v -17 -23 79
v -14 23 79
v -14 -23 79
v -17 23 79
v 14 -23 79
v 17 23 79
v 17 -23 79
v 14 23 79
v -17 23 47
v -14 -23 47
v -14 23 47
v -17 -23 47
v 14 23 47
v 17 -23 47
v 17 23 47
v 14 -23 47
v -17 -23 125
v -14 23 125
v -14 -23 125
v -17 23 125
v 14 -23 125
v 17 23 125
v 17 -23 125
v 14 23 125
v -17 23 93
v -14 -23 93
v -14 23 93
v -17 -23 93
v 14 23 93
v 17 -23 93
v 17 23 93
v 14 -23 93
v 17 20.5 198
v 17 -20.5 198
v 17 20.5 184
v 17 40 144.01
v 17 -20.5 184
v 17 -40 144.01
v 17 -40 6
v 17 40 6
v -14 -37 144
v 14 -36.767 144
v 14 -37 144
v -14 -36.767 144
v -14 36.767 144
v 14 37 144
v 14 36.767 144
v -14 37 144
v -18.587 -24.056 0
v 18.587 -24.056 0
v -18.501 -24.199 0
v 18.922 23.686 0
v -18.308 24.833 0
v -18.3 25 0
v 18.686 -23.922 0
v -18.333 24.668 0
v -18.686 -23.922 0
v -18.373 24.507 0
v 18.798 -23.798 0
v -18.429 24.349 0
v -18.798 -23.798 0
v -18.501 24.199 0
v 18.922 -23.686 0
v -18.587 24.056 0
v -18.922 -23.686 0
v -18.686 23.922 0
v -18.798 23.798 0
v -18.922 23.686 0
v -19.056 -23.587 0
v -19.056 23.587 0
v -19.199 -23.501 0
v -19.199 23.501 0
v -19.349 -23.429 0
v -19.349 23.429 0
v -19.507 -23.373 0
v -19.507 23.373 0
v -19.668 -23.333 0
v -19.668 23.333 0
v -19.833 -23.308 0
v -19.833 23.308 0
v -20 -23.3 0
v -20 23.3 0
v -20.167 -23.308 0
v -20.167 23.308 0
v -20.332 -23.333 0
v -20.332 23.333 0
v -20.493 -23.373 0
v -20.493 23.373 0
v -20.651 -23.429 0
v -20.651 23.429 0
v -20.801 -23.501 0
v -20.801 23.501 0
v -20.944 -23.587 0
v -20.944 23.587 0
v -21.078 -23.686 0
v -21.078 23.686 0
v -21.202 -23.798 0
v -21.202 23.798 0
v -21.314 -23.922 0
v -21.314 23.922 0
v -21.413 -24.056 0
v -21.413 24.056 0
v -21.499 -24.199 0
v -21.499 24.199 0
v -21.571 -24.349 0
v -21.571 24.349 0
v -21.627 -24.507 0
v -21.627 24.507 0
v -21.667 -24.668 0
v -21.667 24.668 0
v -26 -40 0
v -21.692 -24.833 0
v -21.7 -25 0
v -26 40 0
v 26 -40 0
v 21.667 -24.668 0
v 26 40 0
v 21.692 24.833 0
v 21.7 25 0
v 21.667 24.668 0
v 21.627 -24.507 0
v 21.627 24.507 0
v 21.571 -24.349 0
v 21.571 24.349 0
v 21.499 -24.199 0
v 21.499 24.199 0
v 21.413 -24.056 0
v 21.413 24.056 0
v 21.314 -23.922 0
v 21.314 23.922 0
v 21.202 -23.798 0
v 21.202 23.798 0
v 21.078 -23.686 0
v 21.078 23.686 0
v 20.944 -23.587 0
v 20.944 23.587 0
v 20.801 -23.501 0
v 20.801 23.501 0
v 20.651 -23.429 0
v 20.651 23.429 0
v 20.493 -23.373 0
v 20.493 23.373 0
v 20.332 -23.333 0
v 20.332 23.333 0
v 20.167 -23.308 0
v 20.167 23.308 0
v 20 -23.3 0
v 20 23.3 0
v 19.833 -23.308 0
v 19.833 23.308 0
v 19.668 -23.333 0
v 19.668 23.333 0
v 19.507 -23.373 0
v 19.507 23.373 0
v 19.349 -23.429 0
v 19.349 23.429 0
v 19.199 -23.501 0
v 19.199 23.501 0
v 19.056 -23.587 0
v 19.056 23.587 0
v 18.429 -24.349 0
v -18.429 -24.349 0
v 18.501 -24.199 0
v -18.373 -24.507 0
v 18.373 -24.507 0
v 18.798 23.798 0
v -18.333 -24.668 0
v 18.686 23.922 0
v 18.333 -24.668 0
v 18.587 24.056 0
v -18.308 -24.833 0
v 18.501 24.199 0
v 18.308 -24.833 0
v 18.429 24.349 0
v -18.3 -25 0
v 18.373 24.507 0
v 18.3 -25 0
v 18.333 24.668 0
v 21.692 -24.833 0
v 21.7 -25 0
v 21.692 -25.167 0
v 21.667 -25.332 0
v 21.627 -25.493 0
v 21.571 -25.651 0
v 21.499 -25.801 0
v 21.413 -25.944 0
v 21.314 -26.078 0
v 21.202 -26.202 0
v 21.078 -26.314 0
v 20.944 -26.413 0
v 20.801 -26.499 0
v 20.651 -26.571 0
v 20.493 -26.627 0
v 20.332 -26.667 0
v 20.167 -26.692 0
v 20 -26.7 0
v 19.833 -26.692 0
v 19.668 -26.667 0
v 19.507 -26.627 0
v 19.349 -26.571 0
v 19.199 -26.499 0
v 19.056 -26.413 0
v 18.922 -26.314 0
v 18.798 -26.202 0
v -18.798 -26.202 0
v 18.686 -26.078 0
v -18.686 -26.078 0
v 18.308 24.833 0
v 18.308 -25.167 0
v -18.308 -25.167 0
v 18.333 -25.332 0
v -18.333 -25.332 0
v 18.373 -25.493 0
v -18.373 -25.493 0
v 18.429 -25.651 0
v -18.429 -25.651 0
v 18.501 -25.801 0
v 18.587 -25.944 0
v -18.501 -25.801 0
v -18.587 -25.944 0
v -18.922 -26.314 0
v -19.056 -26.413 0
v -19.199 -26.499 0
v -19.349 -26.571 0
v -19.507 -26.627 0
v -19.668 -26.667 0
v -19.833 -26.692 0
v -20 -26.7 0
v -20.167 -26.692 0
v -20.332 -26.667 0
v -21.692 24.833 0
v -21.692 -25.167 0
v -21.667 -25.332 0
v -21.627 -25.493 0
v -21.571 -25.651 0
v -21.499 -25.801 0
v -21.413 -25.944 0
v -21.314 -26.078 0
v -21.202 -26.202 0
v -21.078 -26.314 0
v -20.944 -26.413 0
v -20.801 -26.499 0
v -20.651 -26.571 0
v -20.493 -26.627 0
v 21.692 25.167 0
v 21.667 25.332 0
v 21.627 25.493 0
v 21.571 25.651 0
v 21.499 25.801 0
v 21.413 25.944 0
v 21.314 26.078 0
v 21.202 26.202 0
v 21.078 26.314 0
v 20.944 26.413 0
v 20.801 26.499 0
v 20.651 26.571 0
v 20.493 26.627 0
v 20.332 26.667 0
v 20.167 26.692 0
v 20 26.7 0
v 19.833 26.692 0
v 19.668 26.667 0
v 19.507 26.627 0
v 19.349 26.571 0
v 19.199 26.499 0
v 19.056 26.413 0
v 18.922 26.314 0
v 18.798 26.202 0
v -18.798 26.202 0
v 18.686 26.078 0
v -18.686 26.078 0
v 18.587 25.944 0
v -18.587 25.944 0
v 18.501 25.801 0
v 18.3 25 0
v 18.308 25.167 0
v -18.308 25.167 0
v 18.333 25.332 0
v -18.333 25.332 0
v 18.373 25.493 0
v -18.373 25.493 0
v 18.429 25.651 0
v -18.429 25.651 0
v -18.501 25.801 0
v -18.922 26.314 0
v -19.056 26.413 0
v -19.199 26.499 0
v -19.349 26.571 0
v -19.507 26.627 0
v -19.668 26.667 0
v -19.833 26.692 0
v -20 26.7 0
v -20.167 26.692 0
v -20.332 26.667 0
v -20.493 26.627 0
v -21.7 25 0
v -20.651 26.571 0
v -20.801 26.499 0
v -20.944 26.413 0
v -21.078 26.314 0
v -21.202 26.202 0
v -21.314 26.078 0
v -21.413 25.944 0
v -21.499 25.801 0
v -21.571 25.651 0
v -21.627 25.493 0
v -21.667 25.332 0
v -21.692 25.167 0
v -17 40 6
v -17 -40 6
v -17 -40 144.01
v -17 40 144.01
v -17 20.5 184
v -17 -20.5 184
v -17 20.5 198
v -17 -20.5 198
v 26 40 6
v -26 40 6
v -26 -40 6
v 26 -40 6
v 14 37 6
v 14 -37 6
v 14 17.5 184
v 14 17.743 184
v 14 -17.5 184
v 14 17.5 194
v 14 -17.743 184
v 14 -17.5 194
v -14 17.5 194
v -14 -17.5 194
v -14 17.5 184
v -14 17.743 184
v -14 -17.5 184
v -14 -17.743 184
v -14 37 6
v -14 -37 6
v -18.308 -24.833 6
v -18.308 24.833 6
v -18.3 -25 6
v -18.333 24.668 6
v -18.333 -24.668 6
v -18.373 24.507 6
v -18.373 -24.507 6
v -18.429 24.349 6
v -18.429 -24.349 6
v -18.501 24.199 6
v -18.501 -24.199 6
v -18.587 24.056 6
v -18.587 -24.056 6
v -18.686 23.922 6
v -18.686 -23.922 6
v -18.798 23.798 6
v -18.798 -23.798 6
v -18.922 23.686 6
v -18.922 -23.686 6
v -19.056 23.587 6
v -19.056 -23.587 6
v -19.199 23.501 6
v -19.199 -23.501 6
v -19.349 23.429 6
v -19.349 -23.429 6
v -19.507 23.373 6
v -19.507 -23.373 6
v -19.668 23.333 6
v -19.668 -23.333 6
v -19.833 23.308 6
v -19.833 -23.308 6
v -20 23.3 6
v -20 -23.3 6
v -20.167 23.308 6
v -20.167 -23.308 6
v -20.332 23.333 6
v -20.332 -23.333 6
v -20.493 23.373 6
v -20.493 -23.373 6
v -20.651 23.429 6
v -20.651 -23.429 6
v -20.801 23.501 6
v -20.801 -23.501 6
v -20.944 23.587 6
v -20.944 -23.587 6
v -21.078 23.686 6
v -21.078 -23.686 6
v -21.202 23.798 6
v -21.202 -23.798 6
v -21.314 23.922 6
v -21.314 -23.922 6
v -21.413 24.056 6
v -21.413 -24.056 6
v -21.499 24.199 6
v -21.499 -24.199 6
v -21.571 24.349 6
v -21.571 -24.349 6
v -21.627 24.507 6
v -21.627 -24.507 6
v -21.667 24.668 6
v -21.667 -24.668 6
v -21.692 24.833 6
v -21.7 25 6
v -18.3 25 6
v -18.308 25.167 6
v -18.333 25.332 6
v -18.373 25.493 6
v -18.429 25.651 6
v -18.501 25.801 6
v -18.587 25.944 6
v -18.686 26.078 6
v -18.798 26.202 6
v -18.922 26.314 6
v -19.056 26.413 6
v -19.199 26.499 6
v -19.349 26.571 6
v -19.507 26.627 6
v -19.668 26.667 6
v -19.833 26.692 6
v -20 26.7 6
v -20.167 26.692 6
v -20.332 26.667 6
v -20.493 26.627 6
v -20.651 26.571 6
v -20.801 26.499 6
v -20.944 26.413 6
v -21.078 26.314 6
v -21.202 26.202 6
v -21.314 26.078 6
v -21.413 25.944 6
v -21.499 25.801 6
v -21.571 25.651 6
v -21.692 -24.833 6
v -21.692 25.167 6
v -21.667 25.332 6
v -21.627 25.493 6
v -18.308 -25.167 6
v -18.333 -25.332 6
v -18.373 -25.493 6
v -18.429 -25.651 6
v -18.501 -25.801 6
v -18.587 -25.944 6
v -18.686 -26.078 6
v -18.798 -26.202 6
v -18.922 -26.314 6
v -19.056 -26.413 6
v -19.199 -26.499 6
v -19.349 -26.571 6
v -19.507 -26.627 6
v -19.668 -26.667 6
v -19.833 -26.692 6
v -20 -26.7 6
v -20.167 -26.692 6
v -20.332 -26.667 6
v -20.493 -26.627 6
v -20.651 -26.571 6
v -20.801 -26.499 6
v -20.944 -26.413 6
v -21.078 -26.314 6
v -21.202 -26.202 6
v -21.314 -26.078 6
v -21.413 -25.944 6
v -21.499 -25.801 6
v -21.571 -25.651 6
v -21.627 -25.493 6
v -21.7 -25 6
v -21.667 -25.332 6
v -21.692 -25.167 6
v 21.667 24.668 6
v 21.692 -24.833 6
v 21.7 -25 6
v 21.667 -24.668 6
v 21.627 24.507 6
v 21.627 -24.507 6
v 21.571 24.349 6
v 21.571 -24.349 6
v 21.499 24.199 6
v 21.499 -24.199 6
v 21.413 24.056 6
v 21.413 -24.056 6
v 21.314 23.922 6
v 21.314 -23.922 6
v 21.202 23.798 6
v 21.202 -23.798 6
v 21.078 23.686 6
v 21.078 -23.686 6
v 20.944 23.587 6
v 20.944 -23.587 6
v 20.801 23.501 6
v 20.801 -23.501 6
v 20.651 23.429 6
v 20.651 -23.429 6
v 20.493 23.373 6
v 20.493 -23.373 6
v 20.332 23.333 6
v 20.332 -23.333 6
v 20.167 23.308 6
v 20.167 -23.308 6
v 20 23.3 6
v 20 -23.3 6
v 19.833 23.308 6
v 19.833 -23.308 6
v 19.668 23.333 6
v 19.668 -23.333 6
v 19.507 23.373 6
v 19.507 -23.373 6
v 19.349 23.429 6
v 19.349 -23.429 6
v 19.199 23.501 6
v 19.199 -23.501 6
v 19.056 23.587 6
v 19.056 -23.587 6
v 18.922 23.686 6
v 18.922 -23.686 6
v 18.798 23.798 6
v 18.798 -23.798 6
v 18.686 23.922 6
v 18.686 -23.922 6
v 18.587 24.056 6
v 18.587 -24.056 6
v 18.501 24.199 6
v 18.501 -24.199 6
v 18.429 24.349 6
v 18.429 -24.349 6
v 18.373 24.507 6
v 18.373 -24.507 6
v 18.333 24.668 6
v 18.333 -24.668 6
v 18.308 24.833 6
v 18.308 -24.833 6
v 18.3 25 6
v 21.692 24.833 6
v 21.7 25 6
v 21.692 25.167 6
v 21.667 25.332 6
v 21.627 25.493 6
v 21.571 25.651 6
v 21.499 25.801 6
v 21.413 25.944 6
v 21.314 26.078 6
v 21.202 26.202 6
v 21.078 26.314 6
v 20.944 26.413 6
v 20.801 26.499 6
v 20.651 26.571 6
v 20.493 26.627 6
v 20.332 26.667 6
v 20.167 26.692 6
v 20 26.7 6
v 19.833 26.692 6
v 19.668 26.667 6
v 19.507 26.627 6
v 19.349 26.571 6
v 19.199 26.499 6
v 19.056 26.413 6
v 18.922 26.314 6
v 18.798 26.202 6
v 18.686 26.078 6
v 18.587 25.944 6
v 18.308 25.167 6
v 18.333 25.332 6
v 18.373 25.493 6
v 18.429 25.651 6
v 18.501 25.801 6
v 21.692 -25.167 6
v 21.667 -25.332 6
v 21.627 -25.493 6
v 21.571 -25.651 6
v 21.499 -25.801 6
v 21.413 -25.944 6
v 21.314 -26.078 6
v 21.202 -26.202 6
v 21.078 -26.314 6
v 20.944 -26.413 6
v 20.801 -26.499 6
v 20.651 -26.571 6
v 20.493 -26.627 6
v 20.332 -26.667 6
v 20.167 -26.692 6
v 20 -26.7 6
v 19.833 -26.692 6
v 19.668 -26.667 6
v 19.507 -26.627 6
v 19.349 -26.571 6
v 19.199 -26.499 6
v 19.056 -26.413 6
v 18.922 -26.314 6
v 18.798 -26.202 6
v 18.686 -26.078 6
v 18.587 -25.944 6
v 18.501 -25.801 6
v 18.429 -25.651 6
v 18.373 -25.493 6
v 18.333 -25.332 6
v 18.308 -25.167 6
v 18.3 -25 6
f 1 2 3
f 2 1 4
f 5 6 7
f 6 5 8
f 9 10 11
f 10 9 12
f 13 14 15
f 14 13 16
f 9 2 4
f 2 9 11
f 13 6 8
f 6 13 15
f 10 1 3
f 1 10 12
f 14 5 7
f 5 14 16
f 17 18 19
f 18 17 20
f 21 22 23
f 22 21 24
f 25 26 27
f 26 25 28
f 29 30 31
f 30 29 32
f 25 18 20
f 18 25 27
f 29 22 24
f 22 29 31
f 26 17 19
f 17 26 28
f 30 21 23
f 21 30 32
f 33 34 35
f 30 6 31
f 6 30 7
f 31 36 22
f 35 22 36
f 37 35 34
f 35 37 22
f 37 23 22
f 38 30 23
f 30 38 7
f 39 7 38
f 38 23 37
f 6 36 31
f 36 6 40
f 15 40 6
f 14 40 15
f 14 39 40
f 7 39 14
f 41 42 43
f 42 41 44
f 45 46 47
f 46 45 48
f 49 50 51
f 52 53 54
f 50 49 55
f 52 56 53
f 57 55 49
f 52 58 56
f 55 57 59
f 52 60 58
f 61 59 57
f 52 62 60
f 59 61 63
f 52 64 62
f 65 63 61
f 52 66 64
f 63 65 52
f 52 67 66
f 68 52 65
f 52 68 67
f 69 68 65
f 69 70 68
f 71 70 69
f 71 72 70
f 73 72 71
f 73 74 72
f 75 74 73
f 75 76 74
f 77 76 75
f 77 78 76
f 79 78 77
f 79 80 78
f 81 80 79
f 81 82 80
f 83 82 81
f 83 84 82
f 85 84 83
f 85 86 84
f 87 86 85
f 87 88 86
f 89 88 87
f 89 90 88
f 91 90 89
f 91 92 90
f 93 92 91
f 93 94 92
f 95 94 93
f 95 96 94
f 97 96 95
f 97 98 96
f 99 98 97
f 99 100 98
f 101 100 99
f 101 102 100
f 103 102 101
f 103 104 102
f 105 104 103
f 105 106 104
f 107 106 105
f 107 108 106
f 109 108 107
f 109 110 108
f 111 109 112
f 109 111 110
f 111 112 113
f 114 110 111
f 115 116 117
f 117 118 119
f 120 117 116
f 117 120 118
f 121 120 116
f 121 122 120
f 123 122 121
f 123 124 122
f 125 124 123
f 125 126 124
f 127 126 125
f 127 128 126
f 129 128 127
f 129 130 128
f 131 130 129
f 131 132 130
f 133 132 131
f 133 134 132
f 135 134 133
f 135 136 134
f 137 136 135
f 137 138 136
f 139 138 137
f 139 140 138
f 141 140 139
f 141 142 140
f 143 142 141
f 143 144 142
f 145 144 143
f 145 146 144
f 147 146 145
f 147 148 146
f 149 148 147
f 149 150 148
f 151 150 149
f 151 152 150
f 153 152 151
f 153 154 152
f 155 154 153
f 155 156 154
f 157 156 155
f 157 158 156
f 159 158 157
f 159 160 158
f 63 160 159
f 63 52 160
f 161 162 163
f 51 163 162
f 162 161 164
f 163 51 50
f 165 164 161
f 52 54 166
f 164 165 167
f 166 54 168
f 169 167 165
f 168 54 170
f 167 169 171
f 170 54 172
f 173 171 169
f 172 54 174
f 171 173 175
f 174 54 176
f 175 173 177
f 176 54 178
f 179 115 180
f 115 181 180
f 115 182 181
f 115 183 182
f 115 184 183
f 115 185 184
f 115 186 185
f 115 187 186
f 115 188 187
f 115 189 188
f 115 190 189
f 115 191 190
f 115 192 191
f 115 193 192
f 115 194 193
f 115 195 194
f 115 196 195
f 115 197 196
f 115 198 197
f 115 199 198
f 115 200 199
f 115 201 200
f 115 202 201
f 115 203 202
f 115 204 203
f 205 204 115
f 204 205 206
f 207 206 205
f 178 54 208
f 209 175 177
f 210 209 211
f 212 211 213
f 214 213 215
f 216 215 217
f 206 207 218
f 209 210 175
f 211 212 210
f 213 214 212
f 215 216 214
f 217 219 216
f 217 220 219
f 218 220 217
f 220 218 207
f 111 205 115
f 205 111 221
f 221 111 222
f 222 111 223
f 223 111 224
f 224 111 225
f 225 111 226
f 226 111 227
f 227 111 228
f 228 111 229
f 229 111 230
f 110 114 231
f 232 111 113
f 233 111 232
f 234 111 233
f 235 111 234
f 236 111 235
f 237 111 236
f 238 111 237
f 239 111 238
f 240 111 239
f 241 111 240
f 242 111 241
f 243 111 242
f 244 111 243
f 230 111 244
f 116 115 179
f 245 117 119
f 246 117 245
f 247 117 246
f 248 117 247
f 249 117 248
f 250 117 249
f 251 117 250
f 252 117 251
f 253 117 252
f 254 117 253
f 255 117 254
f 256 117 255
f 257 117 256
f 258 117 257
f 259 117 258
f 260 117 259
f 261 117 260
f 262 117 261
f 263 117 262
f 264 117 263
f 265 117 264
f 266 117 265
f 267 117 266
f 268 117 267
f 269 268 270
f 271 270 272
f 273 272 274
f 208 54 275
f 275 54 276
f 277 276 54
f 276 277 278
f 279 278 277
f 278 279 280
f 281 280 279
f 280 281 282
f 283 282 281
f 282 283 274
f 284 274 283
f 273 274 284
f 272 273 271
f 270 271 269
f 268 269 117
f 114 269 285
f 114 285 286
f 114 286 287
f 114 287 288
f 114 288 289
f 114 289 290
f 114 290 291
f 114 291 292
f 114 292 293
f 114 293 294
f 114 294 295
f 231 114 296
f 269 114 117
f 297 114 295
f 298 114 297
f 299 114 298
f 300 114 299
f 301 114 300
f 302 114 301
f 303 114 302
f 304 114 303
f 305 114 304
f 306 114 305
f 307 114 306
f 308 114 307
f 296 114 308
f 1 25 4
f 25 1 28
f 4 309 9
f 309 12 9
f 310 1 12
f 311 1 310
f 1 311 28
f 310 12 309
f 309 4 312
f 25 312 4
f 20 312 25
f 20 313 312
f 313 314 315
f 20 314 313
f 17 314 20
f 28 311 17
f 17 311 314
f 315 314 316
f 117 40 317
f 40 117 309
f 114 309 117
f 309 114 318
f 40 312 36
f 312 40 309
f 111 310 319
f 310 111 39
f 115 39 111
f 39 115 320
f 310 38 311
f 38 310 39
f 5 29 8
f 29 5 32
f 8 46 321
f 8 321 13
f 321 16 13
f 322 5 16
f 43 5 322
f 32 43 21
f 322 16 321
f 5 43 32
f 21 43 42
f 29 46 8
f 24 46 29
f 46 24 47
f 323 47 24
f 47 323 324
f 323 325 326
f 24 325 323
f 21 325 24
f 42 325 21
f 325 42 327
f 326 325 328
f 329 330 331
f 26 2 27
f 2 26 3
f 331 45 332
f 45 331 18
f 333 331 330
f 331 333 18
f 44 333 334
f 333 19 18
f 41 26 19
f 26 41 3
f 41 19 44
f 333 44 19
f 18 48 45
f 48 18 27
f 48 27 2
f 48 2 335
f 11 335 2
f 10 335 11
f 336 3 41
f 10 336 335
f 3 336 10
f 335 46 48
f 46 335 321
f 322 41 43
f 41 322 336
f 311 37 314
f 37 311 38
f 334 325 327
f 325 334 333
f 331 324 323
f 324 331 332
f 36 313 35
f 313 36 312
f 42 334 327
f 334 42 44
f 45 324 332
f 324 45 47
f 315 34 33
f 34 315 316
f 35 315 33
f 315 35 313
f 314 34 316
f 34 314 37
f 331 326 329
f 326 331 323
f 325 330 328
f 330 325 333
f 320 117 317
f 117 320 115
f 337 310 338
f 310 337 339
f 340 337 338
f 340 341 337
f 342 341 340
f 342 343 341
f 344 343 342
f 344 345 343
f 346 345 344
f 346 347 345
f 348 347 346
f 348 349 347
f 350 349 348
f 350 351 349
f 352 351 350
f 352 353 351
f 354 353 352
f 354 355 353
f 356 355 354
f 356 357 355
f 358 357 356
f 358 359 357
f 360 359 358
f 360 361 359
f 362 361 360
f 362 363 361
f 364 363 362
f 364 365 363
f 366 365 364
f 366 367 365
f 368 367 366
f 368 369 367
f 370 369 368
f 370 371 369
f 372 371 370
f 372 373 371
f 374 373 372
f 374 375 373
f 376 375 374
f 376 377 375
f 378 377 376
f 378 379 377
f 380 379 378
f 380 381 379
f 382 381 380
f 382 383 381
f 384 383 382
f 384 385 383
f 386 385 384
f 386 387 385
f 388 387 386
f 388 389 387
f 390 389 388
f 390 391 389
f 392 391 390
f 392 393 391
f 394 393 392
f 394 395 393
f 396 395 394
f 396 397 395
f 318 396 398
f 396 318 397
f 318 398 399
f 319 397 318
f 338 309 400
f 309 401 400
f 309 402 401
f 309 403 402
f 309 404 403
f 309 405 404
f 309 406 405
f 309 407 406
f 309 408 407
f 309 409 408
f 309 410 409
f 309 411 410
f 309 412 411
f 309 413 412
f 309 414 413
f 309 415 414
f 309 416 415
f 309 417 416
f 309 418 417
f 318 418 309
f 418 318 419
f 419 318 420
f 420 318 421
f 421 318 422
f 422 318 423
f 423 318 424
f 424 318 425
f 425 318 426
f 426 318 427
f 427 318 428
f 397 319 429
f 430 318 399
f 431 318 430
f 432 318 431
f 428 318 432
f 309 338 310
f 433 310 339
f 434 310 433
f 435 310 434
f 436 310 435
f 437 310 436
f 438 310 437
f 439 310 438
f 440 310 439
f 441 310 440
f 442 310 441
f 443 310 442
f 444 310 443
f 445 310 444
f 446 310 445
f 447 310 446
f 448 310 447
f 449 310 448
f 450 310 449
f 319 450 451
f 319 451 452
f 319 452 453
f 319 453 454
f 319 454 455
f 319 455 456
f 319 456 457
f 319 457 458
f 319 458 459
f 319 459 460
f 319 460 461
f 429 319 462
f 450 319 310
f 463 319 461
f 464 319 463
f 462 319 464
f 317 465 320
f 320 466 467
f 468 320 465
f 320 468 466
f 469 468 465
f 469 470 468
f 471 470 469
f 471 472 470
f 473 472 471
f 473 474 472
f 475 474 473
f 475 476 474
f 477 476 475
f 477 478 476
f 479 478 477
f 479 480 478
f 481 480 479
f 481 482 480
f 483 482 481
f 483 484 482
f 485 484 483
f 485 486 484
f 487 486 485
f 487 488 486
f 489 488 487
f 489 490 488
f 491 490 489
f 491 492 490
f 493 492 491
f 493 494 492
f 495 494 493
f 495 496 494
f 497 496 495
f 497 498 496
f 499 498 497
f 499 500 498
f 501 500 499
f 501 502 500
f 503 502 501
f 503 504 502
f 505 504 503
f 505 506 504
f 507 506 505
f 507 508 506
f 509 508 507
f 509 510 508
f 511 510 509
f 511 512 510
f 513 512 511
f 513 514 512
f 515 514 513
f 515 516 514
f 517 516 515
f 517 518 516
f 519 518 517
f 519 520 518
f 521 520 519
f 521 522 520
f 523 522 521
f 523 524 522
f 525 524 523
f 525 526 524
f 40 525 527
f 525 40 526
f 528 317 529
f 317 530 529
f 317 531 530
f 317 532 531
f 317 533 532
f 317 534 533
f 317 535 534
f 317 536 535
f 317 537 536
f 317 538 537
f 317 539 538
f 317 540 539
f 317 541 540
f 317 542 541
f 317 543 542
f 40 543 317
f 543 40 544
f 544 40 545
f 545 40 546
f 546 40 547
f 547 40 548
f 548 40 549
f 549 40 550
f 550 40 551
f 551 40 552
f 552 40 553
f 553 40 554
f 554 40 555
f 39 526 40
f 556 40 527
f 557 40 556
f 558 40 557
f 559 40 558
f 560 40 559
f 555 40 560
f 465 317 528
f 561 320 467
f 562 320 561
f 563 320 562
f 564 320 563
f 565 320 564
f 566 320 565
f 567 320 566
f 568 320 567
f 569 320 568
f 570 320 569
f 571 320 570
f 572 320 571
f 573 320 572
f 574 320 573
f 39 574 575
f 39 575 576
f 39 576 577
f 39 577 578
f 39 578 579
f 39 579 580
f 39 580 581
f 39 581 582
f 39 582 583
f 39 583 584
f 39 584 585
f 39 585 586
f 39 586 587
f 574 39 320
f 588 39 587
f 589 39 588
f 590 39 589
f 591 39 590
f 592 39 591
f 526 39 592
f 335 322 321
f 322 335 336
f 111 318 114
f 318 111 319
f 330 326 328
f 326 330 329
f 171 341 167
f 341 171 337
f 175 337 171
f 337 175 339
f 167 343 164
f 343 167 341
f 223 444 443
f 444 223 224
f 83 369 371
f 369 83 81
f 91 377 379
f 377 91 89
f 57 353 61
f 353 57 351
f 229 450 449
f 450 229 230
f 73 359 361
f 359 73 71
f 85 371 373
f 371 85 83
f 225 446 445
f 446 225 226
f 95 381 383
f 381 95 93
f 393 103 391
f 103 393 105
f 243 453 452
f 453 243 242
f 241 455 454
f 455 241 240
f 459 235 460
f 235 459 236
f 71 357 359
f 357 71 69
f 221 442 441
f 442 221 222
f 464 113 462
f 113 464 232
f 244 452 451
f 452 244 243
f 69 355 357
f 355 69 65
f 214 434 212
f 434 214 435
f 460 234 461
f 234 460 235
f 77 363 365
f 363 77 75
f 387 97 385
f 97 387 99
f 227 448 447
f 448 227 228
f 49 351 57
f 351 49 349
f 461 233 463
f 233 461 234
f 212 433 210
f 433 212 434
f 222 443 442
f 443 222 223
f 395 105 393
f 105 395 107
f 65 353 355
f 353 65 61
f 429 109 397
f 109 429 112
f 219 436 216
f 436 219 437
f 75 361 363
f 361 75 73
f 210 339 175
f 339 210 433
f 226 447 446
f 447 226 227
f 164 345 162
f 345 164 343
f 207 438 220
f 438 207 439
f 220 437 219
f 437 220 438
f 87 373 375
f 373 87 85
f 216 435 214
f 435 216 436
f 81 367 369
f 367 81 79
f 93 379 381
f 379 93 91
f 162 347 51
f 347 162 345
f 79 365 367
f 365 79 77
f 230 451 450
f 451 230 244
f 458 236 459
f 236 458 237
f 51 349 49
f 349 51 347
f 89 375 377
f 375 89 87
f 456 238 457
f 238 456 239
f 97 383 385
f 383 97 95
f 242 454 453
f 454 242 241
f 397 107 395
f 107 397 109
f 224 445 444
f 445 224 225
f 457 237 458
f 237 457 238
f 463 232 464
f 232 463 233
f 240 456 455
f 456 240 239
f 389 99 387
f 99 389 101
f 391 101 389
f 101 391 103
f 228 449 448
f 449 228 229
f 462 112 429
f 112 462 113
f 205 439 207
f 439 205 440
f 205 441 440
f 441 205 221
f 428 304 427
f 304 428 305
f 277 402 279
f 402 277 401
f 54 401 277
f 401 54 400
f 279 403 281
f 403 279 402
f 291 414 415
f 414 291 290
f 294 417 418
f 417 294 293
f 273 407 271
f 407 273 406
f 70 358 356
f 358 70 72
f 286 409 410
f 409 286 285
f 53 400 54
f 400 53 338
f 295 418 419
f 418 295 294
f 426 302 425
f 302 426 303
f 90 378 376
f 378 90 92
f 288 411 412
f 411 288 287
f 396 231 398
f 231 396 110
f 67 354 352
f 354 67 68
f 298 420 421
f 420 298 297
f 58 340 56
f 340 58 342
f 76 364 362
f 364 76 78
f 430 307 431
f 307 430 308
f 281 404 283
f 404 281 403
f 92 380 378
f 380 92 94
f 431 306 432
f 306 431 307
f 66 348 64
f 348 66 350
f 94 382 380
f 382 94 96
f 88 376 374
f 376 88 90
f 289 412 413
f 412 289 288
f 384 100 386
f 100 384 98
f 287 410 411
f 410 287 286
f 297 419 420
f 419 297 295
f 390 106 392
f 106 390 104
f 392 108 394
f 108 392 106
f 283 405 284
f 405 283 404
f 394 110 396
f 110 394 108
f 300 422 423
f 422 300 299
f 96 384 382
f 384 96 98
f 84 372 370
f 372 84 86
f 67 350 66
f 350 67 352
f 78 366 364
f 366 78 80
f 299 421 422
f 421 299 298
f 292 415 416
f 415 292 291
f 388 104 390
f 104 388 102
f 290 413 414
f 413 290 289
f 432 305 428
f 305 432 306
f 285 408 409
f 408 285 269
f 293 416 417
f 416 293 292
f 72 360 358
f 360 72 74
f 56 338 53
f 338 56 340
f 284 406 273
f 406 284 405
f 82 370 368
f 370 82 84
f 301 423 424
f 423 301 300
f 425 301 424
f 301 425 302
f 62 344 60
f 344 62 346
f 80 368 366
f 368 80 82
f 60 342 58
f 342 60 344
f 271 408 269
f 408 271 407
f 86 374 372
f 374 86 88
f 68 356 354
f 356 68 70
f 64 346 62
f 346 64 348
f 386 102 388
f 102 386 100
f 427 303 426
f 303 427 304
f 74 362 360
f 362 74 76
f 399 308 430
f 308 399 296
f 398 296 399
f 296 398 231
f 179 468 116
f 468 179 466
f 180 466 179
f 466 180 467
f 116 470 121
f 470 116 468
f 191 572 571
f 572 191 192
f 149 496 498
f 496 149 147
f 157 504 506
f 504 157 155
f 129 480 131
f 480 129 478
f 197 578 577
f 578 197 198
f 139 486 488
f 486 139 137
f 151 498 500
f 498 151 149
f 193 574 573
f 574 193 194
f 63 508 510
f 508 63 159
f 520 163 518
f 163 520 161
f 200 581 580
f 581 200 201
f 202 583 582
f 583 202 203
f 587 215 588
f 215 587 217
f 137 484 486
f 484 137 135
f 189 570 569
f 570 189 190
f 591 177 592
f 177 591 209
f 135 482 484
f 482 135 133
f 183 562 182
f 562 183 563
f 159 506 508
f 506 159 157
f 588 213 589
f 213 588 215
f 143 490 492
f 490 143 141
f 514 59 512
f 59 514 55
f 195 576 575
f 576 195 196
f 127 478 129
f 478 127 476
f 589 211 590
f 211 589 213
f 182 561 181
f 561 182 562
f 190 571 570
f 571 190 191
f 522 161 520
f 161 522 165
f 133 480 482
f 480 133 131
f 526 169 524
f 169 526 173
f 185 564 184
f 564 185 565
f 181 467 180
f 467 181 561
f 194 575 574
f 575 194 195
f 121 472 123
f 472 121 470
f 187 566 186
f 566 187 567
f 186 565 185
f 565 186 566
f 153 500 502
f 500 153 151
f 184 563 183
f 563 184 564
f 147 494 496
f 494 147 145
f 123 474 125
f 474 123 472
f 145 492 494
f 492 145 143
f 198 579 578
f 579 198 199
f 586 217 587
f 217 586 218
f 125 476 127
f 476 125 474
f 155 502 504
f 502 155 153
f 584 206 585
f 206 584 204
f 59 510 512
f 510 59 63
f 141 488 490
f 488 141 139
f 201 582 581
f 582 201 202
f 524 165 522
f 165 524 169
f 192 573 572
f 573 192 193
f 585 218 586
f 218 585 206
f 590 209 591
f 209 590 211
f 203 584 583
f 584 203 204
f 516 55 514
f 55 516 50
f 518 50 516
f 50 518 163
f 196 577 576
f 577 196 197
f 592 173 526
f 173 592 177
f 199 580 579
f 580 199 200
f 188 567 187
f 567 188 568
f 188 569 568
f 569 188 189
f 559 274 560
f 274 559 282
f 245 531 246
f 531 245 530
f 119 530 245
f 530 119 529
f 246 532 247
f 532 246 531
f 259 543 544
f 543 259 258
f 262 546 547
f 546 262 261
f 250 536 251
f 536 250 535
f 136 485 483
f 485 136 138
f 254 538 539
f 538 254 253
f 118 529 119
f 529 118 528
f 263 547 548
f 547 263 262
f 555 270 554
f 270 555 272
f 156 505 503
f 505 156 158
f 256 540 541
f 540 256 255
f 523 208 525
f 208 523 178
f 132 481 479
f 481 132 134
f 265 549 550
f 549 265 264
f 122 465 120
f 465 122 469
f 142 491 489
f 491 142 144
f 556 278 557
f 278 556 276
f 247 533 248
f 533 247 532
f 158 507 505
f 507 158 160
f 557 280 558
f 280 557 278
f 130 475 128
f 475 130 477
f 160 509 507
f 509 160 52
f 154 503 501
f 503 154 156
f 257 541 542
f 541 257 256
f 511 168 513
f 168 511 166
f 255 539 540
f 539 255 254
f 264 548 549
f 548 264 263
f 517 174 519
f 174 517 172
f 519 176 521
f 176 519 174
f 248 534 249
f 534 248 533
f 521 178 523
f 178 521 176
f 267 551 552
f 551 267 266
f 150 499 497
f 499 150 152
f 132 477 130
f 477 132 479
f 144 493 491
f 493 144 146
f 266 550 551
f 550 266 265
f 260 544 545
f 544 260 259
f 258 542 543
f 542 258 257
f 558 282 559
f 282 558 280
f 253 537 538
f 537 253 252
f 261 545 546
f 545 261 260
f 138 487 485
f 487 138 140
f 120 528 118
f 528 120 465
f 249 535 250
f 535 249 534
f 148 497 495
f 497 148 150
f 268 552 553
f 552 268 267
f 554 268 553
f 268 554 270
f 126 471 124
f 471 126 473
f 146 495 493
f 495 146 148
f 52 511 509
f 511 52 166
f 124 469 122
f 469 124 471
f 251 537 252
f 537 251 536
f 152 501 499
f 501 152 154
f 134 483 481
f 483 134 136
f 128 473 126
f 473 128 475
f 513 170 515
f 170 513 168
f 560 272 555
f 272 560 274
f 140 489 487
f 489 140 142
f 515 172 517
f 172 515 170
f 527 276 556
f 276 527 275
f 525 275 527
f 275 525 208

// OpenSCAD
// Standalone robot lower spine part (foot 80 wide -> H101 waist cap).
// Edit shared dimensions in frame_v4.scad so the assembly and this part stay linked.
// Print UPRIGHT as placed (~198 tall).

part_mode = "lower_spine";
part_cutaway = false;     // true removes a corner quarter to inspect the box interior
print_export = true;      // use high quality $fn for STL export

include <frame_v4.scad>
